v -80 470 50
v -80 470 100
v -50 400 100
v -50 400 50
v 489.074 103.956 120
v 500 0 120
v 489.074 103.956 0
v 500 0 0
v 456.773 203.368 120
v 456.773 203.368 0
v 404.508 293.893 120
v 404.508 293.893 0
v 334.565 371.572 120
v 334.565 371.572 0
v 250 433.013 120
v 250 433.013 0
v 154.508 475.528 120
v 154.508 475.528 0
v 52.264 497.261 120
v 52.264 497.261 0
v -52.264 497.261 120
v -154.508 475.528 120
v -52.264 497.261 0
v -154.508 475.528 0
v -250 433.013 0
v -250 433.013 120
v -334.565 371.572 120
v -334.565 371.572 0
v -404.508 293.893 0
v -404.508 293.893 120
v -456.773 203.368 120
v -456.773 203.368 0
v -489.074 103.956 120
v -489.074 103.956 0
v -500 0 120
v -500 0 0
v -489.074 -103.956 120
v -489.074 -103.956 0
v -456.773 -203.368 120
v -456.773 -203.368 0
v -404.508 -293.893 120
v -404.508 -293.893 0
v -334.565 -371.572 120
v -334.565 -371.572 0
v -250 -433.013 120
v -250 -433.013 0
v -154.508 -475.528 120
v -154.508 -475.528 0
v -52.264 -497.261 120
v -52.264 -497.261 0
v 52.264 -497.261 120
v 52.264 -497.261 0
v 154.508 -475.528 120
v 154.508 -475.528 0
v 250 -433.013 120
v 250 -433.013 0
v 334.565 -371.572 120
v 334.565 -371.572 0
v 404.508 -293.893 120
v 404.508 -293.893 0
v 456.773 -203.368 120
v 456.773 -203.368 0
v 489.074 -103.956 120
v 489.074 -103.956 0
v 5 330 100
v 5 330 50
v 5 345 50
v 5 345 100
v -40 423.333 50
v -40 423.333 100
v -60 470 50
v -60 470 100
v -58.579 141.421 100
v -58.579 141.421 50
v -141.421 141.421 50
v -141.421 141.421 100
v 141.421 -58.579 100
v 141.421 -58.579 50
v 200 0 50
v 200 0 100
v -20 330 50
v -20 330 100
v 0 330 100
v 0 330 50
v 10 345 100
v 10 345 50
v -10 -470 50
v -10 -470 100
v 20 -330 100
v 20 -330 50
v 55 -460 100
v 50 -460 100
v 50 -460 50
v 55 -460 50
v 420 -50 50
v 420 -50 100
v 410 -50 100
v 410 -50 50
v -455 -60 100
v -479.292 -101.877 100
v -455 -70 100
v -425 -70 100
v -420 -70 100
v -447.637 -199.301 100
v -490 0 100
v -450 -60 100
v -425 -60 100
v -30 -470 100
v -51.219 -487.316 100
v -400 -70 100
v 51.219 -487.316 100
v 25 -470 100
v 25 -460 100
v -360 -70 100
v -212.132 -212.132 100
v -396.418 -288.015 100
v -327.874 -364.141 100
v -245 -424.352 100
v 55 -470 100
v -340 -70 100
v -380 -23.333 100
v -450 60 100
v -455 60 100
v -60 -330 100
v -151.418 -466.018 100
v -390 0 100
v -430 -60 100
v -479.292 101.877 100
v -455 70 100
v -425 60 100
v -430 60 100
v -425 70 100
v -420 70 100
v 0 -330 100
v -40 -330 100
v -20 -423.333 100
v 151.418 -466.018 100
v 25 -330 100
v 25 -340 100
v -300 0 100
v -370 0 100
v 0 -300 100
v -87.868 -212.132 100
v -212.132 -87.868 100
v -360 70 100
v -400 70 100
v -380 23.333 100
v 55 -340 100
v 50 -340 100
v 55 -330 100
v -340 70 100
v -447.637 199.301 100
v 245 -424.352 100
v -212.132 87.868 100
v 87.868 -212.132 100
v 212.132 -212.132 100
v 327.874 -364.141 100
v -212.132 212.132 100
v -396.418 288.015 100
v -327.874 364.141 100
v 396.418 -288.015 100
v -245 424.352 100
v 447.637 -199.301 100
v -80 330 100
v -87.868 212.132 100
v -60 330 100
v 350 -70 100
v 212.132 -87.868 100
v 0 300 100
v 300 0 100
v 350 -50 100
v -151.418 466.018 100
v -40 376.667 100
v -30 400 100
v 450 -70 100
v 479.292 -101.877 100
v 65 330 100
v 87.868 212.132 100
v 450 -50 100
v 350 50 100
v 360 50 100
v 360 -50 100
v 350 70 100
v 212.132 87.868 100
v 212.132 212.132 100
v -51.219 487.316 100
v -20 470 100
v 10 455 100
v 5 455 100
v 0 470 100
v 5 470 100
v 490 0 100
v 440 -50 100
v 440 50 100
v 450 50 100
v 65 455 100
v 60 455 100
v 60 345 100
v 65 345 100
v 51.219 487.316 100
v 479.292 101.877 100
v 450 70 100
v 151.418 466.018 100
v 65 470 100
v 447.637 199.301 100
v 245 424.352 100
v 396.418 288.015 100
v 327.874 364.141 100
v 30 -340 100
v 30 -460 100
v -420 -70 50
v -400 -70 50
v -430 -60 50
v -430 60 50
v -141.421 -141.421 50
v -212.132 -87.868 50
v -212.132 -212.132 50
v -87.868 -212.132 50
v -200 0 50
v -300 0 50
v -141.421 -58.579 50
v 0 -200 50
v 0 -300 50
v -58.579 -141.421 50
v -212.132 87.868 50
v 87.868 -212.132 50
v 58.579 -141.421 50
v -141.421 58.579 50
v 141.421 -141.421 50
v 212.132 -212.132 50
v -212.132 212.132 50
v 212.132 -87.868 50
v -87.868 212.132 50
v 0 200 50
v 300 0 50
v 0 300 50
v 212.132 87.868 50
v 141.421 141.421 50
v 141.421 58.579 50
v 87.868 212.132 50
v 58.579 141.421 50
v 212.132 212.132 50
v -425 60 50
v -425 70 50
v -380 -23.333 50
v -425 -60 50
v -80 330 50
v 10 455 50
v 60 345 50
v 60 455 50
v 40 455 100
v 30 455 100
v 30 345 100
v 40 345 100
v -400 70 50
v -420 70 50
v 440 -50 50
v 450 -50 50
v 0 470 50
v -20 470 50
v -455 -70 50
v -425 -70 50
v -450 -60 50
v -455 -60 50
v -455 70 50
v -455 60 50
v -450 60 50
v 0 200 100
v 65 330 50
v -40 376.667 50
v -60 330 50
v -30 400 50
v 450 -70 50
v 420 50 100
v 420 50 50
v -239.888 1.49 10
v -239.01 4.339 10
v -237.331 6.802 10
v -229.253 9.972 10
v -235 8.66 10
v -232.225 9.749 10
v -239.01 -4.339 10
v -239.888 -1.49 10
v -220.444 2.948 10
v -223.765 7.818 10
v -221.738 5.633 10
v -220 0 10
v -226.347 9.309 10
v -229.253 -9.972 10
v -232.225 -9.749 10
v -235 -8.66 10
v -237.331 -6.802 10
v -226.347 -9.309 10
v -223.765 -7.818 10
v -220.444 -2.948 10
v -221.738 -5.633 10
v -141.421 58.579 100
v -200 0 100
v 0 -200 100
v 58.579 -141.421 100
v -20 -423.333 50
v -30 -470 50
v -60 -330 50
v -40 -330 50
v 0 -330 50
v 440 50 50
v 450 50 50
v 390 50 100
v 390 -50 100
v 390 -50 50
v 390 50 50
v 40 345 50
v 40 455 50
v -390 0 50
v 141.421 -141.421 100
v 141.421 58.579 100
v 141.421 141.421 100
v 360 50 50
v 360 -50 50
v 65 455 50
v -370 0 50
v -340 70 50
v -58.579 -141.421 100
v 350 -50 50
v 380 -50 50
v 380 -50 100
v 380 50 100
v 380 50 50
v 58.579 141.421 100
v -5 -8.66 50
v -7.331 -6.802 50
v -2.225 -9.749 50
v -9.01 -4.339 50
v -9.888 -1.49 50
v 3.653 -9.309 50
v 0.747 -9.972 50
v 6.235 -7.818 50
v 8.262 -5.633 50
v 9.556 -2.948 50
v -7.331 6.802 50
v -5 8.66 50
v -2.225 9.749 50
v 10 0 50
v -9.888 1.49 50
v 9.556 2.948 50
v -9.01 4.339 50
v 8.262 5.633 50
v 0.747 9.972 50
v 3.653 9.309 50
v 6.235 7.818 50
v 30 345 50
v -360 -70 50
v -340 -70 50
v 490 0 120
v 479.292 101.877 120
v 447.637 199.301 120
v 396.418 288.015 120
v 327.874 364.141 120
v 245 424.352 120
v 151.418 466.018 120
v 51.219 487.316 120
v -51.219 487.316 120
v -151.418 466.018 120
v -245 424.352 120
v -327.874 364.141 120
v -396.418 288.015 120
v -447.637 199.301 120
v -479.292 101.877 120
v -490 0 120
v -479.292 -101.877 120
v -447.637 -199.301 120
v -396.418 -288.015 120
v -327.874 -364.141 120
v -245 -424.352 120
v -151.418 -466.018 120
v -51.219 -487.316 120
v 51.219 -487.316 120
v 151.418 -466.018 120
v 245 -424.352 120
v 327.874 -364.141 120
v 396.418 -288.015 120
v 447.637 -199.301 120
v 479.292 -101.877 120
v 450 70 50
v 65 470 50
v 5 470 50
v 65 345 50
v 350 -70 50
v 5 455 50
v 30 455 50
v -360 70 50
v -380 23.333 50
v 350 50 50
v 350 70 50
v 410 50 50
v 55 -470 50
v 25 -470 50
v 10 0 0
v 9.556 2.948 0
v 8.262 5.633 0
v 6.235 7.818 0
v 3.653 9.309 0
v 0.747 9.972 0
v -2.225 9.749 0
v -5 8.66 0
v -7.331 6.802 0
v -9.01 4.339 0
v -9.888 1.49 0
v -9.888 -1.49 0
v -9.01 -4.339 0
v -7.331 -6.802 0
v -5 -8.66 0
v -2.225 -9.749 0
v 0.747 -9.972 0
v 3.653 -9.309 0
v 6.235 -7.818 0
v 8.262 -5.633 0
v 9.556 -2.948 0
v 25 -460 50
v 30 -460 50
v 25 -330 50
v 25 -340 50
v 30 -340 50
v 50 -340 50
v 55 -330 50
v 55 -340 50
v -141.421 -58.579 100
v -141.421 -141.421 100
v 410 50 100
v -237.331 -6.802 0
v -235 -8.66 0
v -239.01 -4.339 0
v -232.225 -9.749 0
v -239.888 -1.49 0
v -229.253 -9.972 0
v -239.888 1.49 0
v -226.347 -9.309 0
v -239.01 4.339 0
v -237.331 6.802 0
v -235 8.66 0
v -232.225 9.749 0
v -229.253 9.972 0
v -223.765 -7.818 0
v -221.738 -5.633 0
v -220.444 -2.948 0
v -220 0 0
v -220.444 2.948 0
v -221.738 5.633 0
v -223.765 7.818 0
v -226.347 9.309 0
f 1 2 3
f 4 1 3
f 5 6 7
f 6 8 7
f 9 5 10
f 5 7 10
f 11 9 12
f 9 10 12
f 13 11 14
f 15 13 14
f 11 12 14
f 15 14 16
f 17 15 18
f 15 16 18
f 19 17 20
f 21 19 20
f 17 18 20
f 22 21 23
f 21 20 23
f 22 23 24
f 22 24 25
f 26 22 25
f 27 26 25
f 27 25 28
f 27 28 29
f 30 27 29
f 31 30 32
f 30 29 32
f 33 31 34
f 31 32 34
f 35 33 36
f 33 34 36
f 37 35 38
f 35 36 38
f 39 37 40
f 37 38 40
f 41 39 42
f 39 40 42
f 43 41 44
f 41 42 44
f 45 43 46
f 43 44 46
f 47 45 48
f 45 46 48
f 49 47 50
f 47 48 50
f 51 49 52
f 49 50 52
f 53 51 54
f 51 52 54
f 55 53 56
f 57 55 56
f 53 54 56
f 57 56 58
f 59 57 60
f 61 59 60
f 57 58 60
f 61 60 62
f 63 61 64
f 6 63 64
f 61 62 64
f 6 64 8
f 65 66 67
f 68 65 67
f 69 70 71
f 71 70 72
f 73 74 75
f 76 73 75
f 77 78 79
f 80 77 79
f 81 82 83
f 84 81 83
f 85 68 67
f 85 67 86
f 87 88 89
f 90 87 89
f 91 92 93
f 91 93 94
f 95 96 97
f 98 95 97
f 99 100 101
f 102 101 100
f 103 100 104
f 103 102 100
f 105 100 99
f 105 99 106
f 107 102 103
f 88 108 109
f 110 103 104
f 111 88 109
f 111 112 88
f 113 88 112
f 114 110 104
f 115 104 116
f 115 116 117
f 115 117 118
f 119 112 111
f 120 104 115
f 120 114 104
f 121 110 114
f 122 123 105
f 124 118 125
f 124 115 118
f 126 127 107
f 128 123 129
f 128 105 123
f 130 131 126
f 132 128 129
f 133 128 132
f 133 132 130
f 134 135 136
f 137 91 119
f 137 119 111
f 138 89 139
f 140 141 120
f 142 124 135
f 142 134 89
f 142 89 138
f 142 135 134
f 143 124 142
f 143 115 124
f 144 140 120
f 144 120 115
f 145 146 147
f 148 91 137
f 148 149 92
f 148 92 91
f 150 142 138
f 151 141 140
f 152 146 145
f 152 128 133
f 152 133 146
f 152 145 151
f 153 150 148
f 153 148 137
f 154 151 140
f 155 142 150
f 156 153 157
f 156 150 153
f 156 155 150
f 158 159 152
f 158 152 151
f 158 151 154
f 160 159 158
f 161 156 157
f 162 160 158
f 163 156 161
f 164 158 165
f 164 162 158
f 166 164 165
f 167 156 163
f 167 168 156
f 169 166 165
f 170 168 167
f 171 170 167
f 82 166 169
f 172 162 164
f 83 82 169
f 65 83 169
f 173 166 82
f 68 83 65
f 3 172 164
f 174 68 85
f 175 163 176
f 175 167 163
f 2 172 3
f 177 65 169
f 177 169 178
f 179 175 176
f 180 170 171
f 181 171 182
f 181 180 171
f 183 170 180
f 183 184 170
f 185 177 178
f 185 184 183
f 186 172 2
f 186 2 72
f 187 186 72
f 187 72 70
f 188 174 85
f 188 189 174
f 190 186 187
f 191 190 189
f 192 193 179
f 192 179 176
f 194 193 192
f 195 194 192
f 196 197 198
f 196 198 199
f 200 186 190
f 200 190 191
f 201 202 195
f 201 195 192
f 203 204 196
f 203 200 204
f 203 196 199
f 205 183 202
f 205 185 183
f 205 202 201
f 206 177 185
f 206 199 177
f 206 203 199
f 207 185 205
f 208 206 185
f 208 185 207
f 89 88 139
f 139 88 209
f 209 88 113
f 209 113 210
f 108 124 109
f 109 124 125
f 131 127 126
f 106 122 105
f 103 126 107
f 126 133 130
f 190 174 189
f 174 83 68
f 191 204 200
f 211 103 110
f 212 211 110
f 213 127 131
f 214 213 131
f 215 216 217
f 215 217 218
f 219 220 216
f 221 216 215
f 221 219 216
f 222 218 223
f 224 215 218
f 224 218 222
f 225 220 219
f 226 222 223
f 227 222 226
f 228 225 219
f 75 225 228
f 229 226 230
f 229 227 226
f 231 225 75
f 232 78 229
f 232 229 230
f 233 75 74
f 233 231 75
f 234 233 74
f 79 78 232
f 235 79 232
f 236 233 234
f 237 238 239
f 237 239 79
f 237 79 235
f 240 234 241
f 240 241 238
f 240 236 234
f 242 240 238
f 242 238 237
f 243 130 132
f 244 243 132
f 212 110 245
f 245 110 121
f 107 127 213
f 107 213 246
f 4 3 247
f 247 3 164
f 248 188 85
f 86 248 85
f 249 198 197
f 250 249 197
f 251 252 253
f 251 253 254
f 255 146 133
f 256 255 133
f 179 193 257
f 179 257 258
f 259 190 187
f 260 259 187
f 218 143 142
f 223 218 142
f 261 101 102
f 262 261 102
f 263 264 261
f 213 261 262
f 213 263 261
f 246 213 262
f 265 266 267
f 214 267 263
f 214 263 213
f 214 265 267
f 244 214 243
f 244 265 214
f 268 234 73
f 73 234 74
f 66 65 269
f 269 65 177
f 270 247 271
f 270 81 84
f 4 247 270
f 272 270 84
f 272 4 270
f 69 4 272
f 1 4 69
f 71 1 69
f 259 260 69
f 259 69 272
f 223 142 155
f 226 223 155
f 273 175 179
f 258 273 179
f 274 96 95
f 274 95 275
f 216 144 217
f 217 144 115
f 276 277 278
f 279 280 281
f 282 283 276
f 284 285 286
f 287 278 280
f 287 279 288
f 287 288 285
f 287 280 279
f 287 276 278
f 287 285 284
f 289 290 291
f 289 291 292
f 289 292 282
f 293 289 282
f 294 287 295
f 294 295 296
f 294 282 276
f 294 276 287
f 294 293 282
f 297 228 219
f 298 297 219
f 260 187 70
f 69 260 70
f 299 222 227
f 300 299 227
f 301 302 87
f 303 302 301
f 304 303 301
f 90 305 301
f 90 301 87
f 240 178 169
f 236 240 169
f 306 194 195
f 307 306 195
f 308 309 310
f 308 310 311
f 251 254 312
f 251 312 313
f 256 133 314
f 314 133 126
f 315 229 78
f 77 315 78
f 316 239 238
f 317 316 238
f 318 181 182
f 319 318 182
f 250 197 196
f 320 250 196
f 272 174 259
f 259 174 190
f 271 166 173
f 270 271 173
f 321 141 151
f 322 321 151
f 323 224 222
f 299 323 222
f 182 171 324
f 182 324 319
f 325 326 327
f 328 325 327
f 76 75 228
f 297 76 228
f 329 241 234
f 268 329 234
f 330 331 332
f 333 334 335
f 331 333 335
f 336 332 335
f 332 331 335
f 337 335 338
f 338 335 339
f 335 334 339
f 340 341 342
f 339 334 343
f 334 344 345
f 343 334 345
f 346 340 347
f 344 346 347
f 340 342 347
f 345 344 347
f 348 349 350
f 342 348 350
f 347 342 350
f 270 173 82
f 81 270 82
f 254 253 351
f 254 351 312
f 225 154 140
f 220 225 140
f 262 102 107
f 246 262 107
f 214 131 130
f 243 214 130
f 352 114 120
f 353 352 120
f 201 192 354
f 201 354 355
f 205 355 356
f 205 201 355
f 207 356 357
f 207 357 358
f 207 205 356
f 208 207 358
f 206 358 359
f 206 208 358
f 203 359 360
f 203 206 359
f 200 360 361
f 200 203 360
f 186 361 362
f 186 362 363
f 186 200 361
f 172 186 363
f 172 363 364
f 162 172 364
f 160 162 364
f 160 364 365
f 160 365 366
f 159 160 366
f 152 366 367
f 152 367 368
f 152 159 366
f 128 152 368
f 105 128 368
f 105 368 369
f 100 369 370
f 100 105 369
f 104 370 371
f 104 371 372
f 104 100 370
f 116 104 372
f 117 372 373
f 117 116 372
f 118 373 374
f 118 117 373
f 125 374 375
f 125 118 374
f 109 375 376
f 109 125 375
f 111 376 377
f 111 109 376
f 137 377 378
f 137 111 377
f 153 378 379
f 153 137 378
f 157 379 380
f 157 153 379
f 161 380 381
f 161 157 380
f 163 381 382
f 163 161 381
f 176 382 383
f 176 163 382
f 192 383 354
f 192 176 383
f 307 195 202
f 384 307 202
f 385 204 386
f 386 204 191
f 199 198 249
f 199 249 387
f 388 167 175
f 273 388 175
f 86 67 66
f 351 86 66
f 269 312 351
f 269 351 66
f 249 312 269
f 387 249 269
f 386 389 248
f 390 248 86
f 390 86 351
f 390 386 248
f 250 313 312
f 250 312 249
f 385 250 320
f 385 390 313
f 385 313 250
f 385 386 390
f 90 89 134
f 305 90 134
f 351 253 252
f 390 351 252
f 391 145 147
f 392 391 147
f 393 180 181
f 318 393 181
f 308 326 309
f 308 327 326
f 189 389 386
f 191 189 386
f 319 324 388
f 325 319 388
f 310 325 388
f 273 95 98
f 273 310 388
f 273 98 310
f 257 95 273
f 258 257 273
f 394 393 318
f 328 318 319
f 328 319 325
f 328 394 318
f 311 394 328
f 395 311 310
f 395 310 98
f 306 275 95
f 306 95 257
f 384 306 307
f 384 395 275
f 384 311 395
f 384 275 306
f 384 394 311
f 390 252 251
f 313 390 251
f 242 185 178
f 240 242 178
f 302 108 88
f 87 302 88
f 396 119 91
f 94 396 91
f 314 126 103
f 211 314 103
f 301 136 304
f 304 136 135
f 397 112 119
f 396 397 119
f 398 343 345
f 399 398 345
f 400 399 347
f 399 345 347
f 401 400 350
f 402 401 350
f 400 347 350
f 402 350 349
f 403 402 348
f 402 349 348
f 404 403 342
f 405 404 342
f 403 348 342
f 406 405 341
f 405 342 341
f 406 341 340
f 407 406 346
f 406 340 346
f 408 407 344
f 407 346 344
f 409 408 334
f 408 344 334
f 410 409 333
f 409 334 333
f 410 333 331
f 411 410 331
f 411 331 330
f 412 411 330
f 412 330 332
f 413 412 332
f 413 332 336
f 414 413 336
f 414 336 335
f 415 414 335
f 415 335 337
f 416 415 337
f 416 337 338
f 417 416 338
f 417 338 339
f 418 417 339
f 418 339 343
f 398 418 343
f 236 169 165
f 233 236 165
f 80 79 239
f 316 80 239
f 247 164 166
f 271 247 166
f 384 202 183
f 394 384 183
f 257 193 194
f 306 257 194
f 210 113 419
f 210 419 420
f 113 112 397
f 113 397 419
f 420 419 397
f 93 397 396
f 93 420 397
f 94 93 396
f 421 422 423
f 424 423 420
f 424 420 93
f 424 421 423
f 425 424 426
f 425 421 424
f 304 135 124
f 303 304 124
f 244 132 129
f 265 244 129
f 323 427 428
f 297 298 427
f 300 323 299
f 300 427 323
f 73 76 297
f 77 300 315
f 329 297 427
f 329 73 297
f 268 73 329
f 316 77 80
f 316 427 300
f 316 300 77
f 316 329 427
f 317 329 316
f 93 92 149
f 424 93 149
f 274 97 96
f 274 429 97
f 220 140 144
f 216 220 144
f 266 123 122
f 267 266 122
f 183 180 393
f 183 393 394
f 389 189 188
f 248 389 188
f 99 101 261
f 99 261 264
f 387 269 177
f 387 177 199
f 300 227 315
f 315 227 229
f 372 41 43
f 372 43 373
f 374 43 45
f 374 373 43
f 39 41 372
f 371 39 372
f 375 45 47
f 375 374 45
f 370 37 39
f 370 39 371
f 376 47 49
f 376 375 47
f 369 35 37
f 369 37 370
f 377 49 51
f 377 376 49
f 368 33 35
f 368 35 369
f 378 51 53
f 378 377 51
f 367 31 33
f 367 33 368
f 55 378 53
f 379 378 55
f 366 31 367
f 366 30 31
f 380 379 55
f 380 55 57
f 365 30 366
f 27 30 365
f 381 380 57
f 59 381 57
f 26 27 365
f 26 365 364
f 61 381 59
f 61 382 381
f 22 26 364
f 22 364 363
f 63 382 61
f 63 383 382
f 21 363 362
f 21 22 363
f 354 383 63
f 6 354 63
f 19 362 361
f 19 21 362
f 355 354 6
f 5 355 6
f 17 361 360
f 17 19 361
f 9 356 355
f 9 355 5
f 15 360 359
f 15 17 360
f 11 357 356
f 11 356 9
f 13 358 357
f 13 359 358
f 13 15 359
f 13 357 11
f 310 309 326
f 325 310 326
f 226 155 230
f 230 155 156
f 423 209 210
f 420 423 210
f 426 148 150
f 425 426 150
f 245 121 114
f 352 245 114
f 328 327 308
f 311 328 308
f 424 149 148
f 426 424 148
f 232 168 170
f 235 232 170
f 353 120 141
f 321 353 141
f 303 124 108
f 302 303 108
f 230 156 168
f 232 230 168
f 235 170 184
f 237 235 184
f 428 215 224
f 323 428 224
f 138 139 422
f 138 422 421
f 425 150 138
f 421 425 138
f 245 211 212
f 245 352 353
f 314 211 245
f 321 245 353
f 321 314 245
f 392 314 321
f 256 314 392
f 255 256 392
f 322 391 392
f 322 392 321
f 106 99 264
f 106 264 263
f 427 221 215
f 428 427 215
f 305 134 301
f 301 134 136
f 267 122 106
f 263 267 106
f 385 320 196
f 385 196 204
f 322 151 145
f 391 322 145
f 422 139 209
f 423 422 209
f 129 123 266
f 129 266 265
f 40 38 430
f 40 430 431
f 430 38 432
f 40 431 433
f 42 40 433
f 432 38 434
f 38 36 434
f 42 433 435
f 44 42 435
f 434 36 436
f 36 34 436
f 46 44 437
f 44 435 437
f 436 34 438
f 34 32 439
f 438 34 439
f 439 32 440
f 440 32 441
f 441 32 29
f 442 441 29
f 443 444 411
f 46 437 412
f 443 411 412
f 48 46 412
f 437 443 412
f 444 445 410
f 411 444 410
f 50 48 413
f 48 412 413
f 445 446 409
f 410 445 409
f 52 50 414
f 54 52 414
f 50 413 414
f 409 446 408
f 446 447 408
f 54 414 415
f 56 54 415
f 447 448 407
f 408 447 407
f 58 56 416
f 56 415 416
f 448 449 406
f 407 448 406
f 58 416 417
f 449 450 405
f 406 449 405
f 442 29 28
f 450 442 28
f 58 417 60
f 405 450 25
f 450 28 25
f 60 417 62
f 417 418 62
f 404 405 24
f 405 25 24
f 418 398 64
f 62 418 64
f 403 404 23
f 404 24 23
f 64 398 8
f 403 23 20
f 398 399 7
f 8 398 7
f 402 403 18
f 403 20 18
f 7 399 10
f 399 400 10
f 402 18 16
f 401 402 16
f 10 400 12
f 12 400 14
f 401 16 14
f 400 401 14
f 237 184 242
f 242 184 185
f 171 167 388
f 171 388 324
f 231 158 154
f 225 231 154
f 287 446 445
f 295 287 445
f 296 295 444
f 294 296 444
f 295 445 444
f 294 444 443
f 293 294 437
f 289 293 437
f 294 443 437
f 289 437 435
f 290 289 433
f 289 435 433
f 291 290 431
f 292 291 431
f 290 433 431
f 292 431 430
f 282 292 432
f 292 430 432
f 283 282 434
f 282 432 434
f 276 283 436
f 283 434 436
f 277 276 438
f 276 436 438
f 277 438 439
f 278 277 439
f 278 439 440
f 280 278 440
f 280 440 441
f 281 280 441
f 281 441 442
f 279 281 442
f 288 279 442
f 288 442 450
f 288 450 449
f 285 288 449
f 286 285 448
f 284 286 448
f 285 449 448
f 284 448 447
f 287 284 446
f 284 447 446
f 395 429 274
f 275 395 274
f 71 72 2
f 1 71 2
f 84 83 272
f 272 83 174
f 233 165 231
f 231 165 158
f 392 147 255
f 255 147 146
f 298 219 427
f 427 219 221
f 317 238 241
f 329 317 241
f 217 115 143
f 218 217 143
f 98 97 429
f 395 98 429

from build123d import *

# Parameters (mm, degrees)
F0_R      = 500
F1_DEPTH  = 100
F2_R      = 10
F3_DEPTH  = 100.001
F4_W      = 20
F4_H      = 15
F4_W_2    = 5
F4_W_3    = 10
F4_H_2    = 110
F5_DEPTH  = 50
F6_W      = 20
F6_H      = 20
F6_W_2    = 10
F6_H_2    = 100
F7_DEPTH  = 50
F8_W      = 20
F8_H      = 110
F9_DEPTH  = 50
F10_W     = 20
F10_H     = 10
F10_W_2   = 5
F10_H_2   = 120
F11_DEPTH = 50
F12_W     = 20
F12_H     = 10
F12_W_2   = 5
F12_H_2   = 120
F13_DEPTH = 50
F14_R     = 10
F15_DEPTH = 10
F16_R     = 500
F16_R_2   = 490
F17_DEPTH = 20
F19_DEPTH = 50
F21_DEPTH = 50


with BuildPart() as f1:
    # F0 (on Top) → F1 (new body)
    with BuildSketch(Plane.XY):
        Circle(F0_R)
    extrude(amount=F1_DEPTH)

    # F2 (on face) → F3 (cut, through all)
    with BuildSketch(Plane.XY.offset(100)):
        Circle(F2_R)
    extrude(amount=-F3_DEPTH, mode=Mode.SUBTRACT)

    # F4 (on face) → F5 (cut)
    with BuildSketch(Plane.XY.offset(100)):
        Polygon((-60, 470), (-80, 470), (-50, 400), (-40, 423.3333333333), align=None)
        Polygon((-40, 423.3333333333), (-50, 400), (-40, 376.6666666667), (-30, 400), align=None)
        Polygon((-40, 376.6666666667), (-50, 400), (-80, 330), (-60, 330), align=None)
        Polygon((-30, 400), (-40, 376.6666666667), (-20, 330), (0, 330), align=None)
        Polygon((-20, 470), (-40, 423.3333333333), (-30, 400), (0, 470), align=None)
        with Locations((20, 462.5)):
            Rectangle(F4_W, F4_H)
        with Locations((7.5, 462.5)):
            Rectangle(F4_W_2, F4_H)
        with Locations((35, 462.5)):
            Rectangle(F4_W_3, F4_H)
        with Locations((20, 400)):
            Rectangle(F4_W, F4_H_2)
        with Locations((50, 462.5)):
            Rectangle(F4_W, F4_H)
        with Locations((20, 337.5)):
            Rectangle(F4_W, F4_H)
        with Locations((7.5, 337.5)):
            Rectangle(F4_W_2, F4_H)
        with Locations((35, 337.5)):
            Rectangle(F4_W_3, F4_H)
        with Locations((50, 400)):
            Rectangle(F4_W, F4_H_2)
        with Locations((62.5, 462.5)):
            Rectangle(F4_W_2, F4_H)
        with Locations((50, 337.5)):
            Rectangle(F4_W, F4_H)
        with Locations((62.5, 337.5)):
            Rectangle(F4_W_2, F4_H)
    extrude(amount=-F5_DEPTH, mode=Mode.SUBTRACT)

    # F6 (on face) → F7 (cut)
    with BuildSketch(Plane.XY.offset(100)):
        with Locations((400, 60)):
            Rectangle(F6_W, F6_H)
        with Locations((385, 60)):
            Rectangle(F6_W_2, F6_H)
        with Locations((415, 60)):
            Rectangle(F6_W_2, F6_H)
        with Locations((370, 60)):
            Rectangle(F6_W, F6_H)
        with Locations((430, 60)):
            Rectangle(F6_W, F6_H)
        with Locations((400, -60)):
            Rectangle(F6_W, F6_H)
        with Locations((385, -60)):
            Rectangle(F6_W_2, F6_H)
        with Locations((370, 0)):
            Rectangle(F6_W, F6_H_2)
        with Locations((355, 60)):
            Rectangle(F6_W_2, F6_H)
        with Locations((415, -60)):
            Rectangle(F6_W_2, F6_H)
        with Locations((430, 0)):
            Rectangle(F6_W, F6_H_2)
        with Locations((445, 60)):
            Rectangle(F6_W_2, F6_H)
        with Locations((370, -60)):
            Rectangle(F6_W, F6_H)
        with Locations((430, -60)):
            Rectangle(F6_W, F6_H)
        with Locations((355, -60)):
            Rectangle(F6_W_2, F6_H)
        with Locations((445, -60)):
            Rectangle(F6_W_2, F6_H)
    extrude(amount=-F7_DEPTH, mode=Mode.SUBTRACT)

    # F8 (on face) → F9 (cut)
    with BuildSketch(Plane.XY.offset(100)):
        with Locations((400, 0)):
            Rectangle(F8_W, F8_H)
    extrude(amount=-F9_DEPTH, mode=Mode.SUBTRACT)

    # F10 (on face) → F11 (cut)
    with BuildSketch(Plane.XY.offset(100)):
        Polygon((-40, -330), (-60, -330), (-30, -470), (-20, -423.3333333333), align=None)
        Polygon((-20, -423.3333333333), (-30, -470), (-10, -470), align=None)
        Polygon((0, -330), (-20, -423.3333333333), (-10, -470), (20, -330), align=None)
        with Locations((40, -335)):
            Rectangle(F10_W, F10_H)
        with Locations((27.5, -335)):
            Rectangle(F10_W_2, F10_H)
        with Locations((52.5, -335)):
            Rectangle(F10_W_2, F10_H)
        with Locations((40, -400)):
            Rectangle(F10_W, F10_H_2)
        with Locations((40, -465)):
            Rectangle(F10_W, F10_H)
        with Locations((27.5, -465)):
            Rectangle(F10_W_2, F10_H)
        with Locations((52.5, -465)):
            Rectangle(F10_W_2, F10_H)
    extrude(amount=-F11_DEPTH, mode=Mode.SUBTRACT)

    # F12 (on face) → F13 (cut)
    with BuildSketch(Plane.XY.offset(100)):
        Polygon((-400, 70), (-420, 70), (-390, 0), (-380, 23.3333333333), align=None)
        Polygon((-380, 23.3333333333), (-390, 0), (-380, -23.3333333333), (-370, 0), align=None)
        Polygon((-380, -23.3333333333), (-390, 0), (-420, -70), (-400, -70), align=None)
        Polygon((-370, 0), (-380, -23.3333333333), (-360, -70), (-340, -70), align=None)
        Polygon((-360, 70), (-380, 23.3333333333), (-370, 0), (-340, 70), align=None)
        with Locations((-440, 65)):
            Rectangle(F12_W, F12_H)
        with Locations((-452.5, 65)):
            Rectangle(F12_W_2, F12_H)
        with Locations((-427.5, 65)):
            Rectangle(F12_W_2, F12_H)
        with Locations((-440, 0)):
            Rectangle(F12_W, F12_H_2)
        with Locations((-440, -65)):
            Rectangle(F12_W, F12_H)
        with Locations((-452.5, -65)):
            Rectangle(F12_W_2, F12_H)
        with Locations((-427.5, -65)):
            Rectangle(F12_W_2, F12_H)
    extrude(amount=-F13_DEPTH, mode=Mode.SUBTRACT)

    # F14 (on face) → F15 (cut)
    with BuildSketch(Plane(origin=(0, 0, 0), x_dir=(1, 0, 0), z_dir=(0, 0, -1))):
        with Locations((-230, 0)):
            Circle(F14_R)
    extrude(amount=-F15_DEPTH, mode=Mode.SUBTRACT)

    # F16 (on face) → F17 (join)
    with BuildSketch(Plane.XY.offset(100)):
        Circle(F16_R)
        Circle(F16_R_2, mode=Mode.SUBTRACT)
    extrude(amount=F17_DEPTH)

    # F18 (on face) → F19 (cut)
    with BuildSketch(Plane.XY.offset(100)):
        Polygon((87.867965, 212.132035), (0, 300), (-87.867965, 212.132035), align=None)
        Polygon((87.867965, 212.132035), (-87.867965, 212.132035), (-212.132035, 87.867965), (-212.132035, -87.867965), (-87.867965, -212.132035), (87.867965, -212.132035), (212.132035, -87.867965), (212.132035, 87.867965), align=None)
        Polygon((-212.132035, 87.867965), (-87.867965, 212.132035), (-212.132035, 212.132035), align=None)
        Polygon((212.132035, 212.132035), (87.867965, 212.132035), (212.132035, 87.867965), align=None)
        Polygon((-212.132035, -87.867965), (-212.132035, 87.867965), (-300, 0), align=None)
        Polygon((300, 0), (212.132035, 87.867965), (212.132035, -87.867965), align=None)
        Polygon((-87.867965, -212.132035), (-212.132035, -87.867965), (-212.132035, -212.132035), align=None)
        Polygon((212.132035, -212.132035), (212.132035, -87.867965), (87.867965, -212.132035), align=None)
        Polygon((87.867965, -212.132035), (-87.867965, -212.132035), (0, -300), align=None)
    extrude(amount=-F19_DEPTH, mode=Mode.SUBTRACT)

    # F20 (on face) → F21 (join)
    with BuildSketch(Plane.XY.offset(50)):
        Polygon((58.578645, 141.421355), (0, 200), (-58.578645, 141.421355), align=None)
        Polygon((58.578645, 141.421355), (-58.578645, 141.421355), (-141.421355, 58.578645), (-141.421355, -58.578645), (-58.578645, -141.421355), (58.578645, -141.421355), (141.421355, -58.578645), (141.421355, 58.578645), align=None)
        Polygon((-141.421355, 58.578645), (-58.578645, 141.421355), (-141.421355, 141.421355), align=None)
        Polygon((141.421355, 141.421355), (58.578645, 141.421355), (141.421355, 58.578645), align=None)
        Polygon((-141.421355, -58.578645), (-141.421355, 58.578645), (-200, 0), align=None)
        Polygon((200, 0), (141.421355, 58.578645), (141.421355, -58.578645), align=None)
        Polygon((-58.578645, -141.421355), (-141.421355, -58.578645), (-141.421355, -141.421355), align=None)
        Polygon((141.421355, -141.421355), (141.421355, -58.578645), (58.578645, -141.421355), align=None)
        Polygon((58.578645, -141.421355), (-58.578645, -141.421355), (0, -200), align=None)
    extrude(amount=F21_DEPTH)


solid = f1.part
